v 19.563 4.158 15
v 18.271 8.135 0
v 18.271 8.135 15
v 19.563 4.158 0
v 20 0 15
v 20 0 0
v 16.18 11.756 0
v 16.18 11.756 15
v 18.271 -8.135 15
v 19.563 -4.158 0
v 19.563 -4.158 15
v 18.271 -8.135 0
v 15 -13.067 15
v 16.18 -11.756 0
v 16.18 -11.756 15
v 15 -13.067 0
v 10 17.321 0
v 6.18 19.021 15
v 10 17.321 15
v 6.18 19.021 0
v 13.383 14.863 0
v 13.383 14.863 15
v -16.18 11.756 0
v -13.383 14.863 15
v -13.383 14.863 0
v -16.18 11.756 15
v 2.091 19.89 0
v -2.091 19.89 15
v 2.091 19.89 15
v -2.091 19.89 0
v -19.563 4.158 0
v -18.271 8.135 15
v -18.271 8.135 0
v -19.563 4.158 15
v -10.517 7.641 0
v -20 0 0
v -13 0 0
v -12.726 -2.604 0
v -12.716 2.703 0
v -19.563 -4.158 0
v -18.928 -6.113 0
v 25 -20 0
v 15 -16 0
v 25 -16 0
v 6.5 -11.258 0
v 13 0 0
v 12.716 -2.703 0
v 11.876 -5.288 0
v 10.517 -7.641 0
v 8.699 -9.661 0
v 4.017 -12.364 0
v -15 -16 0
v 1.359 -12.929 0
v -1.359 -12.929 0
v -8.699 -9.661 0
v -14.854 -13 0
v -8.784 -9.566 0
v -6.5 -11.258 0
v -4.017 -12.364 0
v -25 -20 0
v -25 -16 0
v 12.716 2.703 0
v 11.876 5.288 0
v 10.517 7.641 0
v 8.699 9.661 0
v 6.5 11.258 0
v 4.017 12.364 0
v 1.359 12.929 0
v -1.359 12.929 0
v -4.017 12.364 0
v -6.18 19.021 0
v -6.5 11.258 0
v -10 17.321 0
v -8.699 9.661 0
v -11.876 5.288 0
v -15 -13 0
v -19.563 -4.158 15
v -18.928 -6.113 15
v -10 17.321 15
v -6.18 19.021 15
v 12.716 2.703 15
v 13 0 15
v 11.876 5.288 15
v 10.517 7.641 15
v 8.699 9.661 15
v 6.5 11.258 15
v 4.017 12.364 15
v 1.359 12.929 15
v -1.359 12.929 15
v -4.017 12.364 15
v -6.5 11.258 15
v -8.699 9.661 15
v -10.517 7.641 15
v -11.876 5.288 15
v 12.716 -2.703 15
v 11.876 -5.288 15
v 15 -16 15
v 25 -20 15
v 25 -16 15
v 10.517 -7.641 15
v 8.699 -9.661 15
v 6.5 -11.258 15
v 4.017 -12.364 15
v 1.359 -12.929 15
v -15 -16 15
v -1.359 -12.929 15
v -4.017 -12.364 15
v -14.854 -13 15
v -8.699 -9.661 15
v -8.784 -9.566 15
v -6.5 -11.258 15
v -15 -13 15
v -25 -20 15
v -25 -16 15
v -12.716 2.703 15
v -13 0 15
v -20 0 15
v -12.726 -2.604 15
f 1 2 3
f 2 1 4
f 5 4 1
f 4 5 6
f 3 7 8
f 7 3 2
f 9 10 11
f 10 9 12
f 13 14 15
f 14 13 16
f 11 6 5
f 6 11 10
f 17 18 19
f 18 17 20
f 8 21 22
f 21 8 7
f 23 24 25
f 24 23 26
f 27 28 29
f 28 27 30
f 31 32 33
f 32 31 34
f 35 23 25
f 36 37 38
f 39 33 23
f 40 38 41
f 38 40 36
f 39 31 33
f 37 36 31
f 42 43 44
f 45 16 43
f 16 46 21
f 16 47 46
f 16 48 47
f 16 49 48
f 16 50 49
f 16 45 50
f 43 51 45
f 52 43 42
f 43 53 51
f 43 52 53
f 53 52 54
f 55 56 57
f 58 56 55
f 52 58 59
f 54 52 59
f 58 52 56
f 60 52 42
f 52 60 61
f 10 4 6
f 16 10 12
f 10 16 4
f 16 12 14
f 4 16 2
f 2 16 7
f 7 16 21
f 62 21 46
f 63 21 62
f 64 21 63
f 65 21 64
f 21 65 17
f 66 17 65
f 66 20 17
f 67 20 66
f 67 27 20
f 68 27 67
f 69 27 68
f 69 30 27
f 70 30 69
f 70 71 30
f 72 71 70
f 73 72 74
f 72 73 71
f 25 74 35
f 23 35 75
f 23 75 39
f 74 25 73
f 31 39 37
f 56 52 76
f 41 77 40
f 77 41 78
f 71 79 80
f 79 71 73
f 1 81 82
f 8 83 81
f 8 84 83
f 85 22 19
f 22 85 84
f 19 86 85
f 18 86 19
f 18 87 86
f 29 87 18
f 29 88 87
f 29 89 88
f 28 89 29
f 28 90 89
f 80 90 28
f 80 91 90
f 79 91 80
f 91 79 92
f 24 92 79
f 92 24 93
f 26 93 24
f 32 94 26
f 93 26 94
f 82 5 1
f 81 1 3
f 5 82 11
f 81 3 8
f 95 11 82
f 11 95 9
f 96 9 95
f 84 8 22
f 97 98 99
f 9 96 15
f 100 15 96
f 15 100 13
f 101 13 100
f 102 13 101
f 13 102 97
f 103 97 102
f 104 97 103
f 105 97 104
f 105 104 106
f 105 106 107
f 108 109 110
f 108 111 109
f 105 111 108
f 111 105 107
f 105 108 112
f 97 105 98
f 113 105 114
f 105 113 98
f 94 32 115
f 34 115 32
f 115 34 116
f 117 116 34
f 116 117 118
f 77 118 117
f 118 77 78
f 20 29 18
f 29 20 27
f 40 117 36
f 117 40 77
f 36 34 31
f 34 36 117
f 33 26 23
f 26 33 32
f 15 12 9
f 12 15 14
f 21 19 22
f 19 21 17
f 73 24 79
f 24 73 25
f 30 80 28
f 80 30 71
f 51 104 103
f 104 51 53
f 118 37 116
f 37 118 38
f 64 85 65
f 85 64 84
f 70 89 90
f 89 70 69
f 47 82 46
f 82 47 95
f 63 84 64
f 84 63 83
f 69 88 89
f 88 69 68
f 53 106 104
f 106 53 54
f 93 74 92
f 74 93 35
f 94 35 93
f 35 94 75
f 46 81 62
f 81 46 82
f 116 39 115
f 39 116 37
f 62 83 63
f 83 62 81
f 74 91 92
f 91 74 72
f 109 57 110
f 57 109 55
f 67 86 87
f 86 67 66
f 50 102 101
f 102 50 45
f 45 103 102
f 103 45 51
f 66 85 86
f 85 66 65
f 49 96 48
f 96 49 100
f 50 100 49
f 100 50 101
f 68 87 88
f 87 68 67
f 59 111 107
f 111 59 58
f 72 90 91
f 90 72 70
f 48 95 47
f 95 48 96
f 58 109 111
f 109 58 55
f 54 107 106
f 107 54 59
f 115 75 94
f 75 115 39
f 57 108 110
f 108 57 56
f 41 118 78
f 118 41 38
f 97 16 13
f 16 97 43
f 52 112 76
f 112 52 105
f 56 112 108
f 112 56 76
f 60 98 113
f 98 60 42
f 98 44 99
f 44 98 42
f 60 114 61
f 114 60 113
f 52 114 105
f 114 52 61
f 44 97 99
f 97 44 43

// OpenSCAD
difference () {
    cylinder(h=15,d=40);
    translate([0,0,-0.1])cylinder(h=15.2,d=26);
    rotate([0,0,-150.5]) translate([0,-4,-0.1])cube([25,8,15.2]);
}
translate([-15,-20,0])cube([30,7,15]);
translate([-25,-20,0])cube([50,4,15]);
